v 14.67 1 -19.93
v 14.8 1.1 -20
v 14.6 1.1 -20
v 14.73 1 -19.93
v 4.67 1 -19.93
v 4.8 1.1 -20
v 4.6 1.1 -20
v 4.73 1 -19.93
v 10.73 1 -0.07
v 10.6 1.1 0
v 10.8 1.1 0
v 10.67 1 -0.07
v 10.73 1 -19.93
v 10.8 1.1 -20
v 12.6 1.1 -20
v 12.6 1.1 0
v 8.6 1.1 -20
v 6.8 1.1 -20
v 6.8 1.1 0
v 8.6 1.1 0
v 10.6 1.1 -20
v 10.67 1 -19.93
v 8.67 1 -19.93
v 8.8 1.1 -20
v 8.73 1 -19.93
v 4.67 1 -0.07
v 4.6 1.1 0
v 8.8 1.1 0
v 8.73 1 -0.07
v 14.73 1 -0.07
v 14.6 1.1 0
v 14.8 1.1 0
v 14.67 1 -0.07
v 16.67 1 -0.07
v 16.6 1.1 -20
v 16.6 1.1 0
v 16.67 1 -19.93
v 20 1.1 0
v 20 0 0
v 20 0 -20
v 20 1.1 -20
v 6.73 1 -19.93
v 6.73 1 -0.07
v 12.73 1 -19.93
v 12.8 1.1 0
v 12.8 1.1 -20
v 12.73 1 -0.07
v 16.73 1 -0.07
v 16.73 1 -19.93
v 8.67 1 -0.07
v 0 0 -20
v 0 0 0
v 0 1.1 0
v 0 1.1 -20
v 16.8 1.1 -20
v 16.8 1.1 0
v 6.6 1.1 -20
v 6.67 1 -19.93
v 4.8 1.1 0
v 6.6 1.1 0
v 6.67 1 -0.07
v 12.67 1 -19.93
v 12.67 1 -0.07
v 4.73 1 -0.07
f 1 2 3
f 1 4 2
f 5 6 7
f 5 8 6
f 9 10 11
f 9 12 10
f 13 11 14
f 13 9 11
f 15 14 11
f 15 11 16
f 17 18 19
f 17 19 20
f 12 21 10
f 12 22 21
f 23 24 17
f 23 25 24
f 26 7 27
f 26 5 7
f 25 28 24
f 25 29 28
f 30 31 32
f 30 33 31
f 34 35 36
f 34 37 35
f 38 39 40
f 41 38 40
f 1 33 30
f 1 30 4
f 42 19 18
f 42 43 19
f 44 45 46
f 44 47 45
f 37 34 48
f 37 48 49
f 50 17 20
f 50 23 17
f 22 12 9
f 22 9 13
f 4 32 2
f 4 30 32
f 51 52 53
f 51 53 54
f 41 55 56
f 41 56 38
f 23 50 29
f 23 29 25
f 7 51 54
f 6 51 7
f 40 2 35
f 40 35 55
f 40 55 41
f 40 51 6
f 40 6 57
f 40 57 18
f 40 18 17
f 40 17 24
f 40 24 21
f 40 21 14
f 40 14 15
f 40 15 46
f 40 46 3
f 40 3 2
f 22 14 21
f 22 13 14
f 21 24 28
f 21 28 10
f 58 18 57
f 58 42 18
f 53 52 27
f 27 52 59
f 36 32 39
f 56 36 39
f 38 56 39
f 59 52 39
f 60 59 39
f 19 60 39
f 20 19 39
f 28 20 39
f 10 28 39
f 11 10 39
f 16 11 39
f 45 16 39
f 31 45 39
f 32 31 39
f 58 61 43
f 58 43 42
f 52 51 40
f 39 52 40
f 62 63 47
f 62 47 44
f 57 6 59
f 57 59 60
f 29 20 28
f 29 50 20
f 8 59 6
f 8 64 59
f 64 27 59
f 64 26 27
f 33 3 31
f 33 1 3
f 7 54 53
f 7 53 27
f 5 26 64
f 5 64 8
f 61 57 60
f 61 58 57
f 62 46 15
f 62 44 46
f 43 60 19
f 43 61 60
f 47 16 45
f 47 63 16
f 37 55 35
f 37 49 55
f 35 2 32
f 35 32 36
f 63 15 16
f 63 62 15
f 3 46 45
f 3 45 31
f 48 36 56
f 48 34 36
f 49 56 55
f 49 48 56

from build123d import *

# Parameters (mm, degrees)
SKETCH1_W           = 20
SKETCH1_H           = 20
BOSS_EXTRUDE2_DEPTH = 1.1
SKETCH2_W           = 0.2
SKETCH2_H           = 20
CUT_EXTRUDE1_DEPTH  = 0.1
CUT_EXTRUDE1_TAPER  = 35


with BuildPart() as part:
    # Sketch1 → Boss-Extrude2 (new body)
    with BuildSketch(Plane(origin=(0, 0, 0), x_dir=(1, 0, 0), z_dir=(0, 1, 0))):
        with Locations((10, 10)):
            Rectangle(SKETCH1_W, SKETCH1_H)
    extrude(amount=BOSS_EXTRUDE2_DEPTH)

    # Sketch2 → Cut-Extrude1 (cut)
    with BuildSketch(Plane(origin=(0, 1.1, 0), x_dir=(1, 0, 0), z_dir=(0, 1, 0))):
        with Locations((16.7, 10)):
            Rectangle(SKETCH2_W, SKETCH2_H)
        with Locations((14.7, 10)):
            Rectangle(SKETCH2_W, SKETCH2_H)
        with Locations((12.7, 10)):
            Rectangle(SKETCH2_W, SKETCH2_H)
        with Locations((10.7, 10)):
            Rectangle(SKETCH2_W, SKETCH2_H)
        with Locations((8.7, 10)):
            Rectangle(SKETCH2_W, SKETCH2_H)
        with Locations((6.7, 10)):
            Rectangle(SKETCH2_W, SKETCH2_H)
        with Locations((4.7, 10)):
            Rectangle(SKETCH2_W, SKETCH2_H)
    extrude(amount=-CUT_EXTRUDE1_DEPTH, taper=CUT_EXTRUDE1_TAPER, mode=Mode.SUBTRACT)


solid = part.part
